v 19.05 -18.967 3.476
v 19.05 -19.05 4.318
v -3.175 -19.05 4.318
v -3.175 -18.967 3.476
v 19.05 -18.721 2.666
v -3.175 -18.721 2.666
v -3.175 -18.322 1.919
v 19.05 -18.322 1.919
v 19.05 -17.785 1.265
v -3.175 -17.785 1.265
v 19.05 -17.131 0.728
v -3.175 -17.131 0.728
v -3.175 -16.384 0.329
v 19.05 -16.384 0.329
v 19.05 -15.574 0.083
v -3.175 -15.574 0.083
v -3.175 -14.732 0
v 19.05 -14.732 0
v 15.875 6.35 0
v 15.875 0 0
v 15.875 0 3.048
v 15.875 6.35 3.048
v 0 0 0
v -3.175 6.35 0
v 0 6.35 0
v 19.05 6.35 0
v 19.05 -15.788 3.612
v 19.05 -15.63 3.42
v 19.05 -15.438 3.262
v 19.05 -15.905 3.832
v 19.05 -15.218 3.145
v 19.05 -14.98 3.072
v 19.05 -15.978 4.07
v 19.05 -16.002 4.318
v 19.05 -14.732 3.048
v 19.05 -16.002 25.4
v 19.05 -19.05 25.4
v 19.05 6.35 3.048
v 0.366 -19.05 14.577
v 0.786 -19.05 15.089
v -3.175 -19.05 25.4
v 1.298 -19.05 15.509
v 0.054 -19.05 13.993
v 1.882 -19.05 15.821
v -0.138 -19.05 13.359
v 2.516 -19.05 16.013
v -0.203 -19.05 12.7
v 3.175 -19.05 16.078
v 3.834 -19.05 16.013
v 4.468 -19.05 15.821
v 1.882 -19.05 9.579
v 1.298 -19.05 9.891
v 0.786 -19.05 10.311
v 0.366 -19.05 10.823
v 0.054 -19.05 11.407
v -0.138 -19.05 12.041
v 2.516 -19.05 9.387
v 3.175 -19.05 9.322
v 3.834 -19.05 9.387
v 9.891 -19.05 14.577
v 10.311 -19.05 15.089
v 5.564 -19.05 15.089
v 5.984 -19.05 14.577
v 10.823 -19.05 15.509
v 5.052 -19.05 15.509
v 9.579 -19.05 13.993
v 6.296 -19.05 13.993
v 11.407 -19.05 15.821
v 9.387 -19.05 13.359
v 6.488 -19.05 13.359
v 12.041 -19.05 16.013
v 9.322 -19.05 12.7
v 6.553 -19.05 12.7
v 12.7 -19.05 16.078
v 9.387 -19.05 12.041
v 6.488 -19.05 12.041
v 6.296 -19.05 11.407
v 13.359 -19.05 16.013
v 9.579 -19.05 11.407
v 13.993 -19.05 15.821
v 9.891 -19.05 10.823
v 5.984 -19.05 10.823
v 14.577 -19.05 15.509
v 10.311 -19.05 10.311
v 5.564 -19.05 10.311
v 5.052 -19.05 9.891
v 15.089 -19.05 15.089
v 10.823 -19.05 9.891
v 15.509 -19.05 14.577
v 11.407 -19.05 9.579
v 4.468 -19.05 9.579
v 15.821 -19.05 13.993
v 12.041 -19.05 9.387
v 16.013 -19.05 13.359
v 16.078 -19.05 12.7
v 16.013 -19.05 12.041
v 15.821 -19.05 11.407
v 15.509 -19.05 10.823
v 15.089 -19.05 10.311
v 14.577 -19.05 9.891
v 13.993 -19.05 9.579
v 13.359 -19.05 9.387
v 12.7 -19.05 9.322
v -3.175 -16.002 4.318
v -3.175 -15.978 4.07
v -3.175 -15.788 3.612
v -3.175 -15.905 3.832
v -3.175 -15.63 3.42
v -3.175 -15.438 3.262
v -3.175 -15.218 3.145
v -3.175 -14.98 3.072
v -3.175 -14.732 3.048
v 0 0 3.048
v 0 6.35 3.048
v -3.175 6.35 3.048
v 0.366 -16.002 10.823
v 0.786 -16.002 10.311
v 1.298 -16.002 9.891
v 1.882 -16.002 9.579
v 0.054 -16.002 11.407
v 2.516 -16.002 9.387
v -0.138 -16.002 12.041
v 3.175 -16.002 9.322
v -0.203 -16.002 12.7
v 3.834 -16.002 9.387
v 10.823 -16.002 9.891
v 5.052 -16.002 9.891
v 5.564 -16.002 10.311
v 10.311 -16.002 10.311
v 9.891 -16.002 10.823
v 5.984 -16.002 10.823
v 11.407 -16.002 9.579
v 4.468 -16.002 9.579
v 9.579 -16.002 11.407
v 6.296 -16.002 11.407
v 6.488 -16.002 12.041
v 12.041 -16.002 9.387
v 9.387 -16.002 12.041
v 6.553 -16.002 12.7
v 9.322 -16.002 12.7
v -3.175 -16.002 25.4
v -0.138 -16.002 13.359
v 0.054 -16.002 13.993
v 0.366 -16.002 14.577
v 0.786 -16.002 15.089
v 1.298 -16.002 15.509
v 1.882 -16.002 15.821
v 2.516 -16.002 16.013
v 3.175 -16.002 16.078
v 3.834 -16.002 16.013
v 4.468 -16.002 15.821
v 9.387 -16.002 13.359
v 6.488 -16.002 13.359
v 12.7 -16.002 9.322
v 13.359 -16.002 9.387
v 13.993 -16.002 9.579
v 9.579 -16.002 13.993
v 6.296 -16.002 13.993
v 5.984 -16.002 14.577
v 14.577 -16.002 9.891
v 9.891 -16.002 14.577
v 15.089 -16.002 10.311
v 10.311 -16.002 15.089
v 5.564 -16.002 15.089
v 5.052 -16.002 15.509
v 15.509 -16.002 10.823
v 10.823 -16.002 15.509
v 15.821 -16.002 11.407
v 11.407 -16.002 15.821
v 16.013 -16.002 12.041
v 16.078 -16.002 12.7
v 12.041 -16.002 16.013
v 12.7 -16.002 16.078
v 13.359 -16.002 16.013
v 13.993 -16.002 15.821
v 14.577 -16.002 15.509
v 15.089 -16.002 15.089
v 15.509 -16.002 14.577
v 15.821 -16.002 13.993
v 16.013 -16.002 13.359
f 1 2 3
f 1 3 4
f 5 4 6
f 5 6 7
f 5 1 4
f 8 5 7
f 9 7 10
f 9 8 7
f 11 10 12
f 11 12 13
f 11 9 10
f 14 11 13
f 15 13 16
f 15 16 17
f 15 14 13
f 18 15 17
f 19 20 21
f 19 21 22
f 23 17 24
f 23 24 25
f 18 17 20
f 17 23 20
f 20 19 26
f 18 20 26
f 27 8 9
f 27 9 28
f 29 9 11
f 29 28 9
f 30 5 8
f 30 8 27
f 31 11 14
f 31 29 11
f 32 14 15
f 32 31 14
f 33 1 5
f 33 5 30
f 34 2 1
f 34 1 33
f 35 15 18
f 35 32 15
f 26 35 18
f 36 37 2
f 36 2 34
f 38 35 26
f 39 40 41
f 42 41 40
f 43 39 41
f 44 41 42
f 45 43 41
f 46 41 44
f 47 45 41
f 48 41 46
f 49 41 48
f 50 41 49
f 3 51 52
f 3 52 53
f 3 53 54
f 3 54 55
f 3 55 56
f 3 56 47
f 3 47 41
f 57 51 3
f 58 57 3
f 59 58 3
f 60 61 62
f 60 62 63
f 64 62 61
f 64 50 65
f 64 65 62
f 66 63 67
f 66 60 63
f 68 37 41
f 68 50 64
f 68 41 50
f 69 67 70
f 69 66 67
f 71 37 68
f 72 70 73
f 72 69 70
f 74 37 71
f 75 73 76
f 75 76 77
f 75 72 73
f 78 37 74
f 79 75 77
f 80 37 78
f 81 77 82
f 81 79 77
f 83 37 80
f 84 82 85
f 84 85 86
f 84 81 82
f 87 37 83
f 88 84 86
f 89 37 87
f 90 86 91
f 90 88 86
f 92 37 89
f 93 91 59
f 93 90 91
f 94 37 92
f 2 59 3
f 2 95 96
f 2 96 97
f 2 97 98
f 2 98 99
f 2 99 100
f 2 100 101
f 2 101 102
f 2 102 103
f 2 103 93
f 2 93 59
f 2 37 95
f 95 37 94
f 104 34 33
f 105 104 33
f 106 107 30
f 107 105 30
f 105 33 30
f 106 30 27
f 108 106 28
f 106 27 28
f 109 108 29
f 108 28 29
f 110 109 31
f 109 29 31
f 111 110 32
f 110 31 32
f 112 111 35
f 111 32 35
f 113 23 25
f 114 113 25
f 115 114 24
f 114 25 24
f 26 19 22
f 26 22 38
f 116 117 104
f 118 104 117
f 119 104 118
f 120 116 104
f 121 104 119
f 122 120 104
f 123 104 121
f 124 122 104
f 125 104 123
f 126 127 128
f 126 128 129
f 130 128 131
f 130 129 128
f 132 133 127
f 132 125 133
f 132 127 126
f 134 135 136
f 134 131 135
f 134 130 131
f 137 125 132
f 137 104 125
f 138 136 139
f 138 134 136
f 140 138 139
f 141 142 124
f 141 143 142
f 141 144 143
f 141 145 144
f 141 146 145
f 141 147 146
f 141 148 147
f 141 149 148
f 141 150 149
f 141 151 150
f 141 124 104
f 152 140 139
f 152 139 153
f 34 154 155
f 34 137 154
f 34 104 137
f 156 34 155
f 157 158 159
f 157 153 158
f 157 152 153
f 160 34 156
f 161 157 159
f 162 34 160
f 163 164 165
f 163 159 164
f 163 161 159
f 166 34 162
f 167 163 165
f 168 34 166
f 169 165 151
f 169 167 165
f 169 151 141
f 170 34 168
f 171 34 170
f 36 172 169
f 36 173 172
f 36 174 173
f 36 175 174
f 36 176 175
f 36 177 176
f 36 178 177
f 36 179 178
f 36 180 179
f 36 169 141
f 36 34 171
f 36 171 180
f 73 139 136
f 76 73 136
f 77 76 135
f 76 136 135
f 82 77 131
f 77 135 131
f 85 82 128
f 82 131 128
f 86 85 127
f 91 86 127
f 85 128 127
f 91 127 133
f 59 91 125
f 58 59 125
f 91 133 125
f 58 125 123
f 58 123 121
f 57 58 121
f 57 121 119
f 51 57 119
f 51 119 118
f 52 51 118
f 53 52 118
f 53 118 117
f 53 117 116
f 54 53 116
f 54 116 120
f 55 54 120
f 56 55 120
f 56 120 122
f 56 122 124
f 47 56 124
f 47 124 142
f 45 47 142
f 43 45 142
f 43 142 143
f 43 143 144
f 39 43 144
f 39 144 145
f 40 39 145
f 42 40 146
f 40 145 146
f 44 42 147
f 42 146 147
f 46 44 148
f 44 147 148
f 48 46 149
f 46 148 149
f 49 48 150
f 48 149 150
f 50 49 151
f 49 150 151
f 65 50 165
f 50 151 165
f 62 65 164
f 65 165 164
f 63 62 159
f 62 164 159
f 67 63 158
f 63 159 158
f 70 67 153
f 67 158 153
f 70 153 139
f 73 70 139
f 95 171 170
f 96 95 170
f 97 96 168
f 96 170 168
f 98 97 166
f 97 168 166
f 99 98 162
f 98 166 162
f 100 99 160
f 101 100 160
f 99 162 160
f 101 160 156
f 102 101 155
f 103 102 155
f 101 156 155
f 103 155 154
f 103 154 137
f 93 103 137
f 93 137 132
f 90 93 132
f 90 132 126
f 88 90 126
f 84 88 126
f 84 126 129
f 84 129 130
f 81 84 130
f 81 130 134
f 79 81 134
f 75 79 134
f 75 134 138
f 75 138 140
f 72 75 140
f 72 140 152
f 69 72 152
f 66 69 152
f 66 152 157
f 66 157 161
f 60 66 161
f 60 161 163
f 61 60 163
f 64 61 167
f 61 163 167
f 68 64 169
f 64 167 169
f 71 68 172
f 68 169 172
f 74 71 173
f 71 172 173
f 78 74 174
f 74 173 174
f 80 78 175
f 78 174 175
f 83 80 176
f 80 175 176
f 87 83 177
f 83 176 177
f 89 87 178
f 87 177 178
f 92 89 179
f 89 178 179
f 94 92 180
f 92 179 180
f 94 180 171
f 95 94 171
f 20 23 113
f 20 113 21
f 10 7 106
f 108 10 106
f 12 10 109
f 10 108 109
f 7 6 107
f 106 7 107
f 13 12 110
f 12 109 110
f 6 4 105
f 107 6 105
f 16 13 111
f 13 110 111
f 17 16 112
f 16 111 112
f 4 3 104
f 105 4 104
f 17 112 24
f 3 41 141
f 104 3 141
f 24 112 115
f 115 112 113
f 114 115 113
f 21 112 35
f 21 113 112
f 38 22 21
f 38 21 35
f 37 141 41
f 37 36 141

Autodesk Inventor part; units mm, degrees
ref_plane "YZ Plane" through (0, 0, 0) normal (1, 0, 0) x (0, 1, 0)
ref_plane "XZ Plane" through (0, 0, 0) normal (0, 1, 0) x (-1, 0, 0)
ref_plane "XY Plane" through (0, 0, 0) normal (0, 0, 1) x (1, 0, 0)
sketch "Sketch1" plane through (0, 0, 0) normal (0, 0, 1) x (1, 0, 0)
  line L0 (0, 0) -> (0, 6.35)
  line L1 (0, 6.35) -> (-3.175, 6.35)
  line L2 (-3.175, 6.35) -> (-3.175, -3.175)
  line L3 (0, 0) -> (15.875, 0)
  line L4 (15.875, 0) -> (15.875, 6.35)
  line L5 (15.875, 6.35) -> (19.05, 6.35)
  line L6 (19.05, 6.35) -> (19.05, -3.175)
  line L7 (-3.175, -3.175) -> (-3.175, -19.05)
  line L8 (-3.175, -19.05) -> (19.05, -19.05)
  line L9 (19.05, -19.05) -> (19.05, -3.175)
  dimension "d0" = 6.35
  dimension "d1" = 3.175
  dimension "d2" = 9.525
  dimension "d3" = 15.875
  dimension "d4" = 3.175
  dimension "d6" = 15.875
extrude "Plate1" add sketch "Sketch1" along normal blind 3.048
sketch "Sketch2" plane through (19.05, -16.002, 0) normal (0, -1, 0) x (1, 0, 0)
  line L0 (-22.225, 0) -> (0, 0)
  line L1 (0, 0) -> (0, 25.4)
  line L2 (0, 25.4) -> (-22.225, 25.4)
  line L3 (-22.225, 25.4) -> (-22.225, 0)
edge flange "Flange1" height 25.4 angle 90 thickness 3.048 bend radius 1.27 thickness toward (0, -1, 0) relief tear relief width 3.048 relief depth 1.524 edges at (7.9375, -19.05, 3.048) wall of the first edge with corners at (-3.175, -16.002, 0) (19.05, -16.002, 0) (19.05, -16.002, 25.4) (-3.175, -16.002, 25.4)
bend "Bend1"
corner "Corner1"
sketch "Sketch3" plane through (-3.175, -16.002, 25.4) normal (0, 1, 0) x (1, 0, 0)
  line L0 (0, 0) -> (0, 21.082) projected
  line L1 (0, 0) -> (22.225, 0) projected
  line L2 (22.225, 0) -> (22.225, 21.082) projected
  circle A0 centre (6.35, 12.7) radius 3.3782
  circle A1 centre (15.875, 12.7) radius 3.3782
  point P0 (3.175, 25.4)
  dimension "d23" = 6.7564
  dimension "d24" = 6.7564
  dimension "d25" = 12.7
  dimension "d26" = 12.7
  dimension "d27" = 6.35
  dimension "d28" = 6.35
extrude "Cut1" cut sketch "Sketch3" against normal blind 3.048
equation "\"d29\" = Thickness"
equation "\"d13\" = BendReliefWidth"
equation "\"d14\" = BendReliefDepth"
equation "\"d15\" = MinimumRemnant"
equation "\"d16\" = BendRadius"
equation "\"d20\" = CornerReliefSize"
equation "\"d21\" = GapSize"
equation "\"d22\" = JacobiRadiusSize"
equation "\"BendRadius\" = Thickness"
equation "\"BendReliefWidth\" = Thickness"
equation "\"BendReliefDepth\" = 0.5 * Thickness"
equation "\"CornerReliefSize\" = 4 * Thickness"
equation "\"MinimumRemnant\" = 2 * Thickness"
equation "\"TransitionRadius\" = BendRadius"
equation "\"JacobiRadiusSize\" = BendRadius"
equation "\"GapSize\" = Thickness"
equation "\"d12\" = BendRadius"
equation "\"Thickness\" = 3.048"
properties part number "Glider"
